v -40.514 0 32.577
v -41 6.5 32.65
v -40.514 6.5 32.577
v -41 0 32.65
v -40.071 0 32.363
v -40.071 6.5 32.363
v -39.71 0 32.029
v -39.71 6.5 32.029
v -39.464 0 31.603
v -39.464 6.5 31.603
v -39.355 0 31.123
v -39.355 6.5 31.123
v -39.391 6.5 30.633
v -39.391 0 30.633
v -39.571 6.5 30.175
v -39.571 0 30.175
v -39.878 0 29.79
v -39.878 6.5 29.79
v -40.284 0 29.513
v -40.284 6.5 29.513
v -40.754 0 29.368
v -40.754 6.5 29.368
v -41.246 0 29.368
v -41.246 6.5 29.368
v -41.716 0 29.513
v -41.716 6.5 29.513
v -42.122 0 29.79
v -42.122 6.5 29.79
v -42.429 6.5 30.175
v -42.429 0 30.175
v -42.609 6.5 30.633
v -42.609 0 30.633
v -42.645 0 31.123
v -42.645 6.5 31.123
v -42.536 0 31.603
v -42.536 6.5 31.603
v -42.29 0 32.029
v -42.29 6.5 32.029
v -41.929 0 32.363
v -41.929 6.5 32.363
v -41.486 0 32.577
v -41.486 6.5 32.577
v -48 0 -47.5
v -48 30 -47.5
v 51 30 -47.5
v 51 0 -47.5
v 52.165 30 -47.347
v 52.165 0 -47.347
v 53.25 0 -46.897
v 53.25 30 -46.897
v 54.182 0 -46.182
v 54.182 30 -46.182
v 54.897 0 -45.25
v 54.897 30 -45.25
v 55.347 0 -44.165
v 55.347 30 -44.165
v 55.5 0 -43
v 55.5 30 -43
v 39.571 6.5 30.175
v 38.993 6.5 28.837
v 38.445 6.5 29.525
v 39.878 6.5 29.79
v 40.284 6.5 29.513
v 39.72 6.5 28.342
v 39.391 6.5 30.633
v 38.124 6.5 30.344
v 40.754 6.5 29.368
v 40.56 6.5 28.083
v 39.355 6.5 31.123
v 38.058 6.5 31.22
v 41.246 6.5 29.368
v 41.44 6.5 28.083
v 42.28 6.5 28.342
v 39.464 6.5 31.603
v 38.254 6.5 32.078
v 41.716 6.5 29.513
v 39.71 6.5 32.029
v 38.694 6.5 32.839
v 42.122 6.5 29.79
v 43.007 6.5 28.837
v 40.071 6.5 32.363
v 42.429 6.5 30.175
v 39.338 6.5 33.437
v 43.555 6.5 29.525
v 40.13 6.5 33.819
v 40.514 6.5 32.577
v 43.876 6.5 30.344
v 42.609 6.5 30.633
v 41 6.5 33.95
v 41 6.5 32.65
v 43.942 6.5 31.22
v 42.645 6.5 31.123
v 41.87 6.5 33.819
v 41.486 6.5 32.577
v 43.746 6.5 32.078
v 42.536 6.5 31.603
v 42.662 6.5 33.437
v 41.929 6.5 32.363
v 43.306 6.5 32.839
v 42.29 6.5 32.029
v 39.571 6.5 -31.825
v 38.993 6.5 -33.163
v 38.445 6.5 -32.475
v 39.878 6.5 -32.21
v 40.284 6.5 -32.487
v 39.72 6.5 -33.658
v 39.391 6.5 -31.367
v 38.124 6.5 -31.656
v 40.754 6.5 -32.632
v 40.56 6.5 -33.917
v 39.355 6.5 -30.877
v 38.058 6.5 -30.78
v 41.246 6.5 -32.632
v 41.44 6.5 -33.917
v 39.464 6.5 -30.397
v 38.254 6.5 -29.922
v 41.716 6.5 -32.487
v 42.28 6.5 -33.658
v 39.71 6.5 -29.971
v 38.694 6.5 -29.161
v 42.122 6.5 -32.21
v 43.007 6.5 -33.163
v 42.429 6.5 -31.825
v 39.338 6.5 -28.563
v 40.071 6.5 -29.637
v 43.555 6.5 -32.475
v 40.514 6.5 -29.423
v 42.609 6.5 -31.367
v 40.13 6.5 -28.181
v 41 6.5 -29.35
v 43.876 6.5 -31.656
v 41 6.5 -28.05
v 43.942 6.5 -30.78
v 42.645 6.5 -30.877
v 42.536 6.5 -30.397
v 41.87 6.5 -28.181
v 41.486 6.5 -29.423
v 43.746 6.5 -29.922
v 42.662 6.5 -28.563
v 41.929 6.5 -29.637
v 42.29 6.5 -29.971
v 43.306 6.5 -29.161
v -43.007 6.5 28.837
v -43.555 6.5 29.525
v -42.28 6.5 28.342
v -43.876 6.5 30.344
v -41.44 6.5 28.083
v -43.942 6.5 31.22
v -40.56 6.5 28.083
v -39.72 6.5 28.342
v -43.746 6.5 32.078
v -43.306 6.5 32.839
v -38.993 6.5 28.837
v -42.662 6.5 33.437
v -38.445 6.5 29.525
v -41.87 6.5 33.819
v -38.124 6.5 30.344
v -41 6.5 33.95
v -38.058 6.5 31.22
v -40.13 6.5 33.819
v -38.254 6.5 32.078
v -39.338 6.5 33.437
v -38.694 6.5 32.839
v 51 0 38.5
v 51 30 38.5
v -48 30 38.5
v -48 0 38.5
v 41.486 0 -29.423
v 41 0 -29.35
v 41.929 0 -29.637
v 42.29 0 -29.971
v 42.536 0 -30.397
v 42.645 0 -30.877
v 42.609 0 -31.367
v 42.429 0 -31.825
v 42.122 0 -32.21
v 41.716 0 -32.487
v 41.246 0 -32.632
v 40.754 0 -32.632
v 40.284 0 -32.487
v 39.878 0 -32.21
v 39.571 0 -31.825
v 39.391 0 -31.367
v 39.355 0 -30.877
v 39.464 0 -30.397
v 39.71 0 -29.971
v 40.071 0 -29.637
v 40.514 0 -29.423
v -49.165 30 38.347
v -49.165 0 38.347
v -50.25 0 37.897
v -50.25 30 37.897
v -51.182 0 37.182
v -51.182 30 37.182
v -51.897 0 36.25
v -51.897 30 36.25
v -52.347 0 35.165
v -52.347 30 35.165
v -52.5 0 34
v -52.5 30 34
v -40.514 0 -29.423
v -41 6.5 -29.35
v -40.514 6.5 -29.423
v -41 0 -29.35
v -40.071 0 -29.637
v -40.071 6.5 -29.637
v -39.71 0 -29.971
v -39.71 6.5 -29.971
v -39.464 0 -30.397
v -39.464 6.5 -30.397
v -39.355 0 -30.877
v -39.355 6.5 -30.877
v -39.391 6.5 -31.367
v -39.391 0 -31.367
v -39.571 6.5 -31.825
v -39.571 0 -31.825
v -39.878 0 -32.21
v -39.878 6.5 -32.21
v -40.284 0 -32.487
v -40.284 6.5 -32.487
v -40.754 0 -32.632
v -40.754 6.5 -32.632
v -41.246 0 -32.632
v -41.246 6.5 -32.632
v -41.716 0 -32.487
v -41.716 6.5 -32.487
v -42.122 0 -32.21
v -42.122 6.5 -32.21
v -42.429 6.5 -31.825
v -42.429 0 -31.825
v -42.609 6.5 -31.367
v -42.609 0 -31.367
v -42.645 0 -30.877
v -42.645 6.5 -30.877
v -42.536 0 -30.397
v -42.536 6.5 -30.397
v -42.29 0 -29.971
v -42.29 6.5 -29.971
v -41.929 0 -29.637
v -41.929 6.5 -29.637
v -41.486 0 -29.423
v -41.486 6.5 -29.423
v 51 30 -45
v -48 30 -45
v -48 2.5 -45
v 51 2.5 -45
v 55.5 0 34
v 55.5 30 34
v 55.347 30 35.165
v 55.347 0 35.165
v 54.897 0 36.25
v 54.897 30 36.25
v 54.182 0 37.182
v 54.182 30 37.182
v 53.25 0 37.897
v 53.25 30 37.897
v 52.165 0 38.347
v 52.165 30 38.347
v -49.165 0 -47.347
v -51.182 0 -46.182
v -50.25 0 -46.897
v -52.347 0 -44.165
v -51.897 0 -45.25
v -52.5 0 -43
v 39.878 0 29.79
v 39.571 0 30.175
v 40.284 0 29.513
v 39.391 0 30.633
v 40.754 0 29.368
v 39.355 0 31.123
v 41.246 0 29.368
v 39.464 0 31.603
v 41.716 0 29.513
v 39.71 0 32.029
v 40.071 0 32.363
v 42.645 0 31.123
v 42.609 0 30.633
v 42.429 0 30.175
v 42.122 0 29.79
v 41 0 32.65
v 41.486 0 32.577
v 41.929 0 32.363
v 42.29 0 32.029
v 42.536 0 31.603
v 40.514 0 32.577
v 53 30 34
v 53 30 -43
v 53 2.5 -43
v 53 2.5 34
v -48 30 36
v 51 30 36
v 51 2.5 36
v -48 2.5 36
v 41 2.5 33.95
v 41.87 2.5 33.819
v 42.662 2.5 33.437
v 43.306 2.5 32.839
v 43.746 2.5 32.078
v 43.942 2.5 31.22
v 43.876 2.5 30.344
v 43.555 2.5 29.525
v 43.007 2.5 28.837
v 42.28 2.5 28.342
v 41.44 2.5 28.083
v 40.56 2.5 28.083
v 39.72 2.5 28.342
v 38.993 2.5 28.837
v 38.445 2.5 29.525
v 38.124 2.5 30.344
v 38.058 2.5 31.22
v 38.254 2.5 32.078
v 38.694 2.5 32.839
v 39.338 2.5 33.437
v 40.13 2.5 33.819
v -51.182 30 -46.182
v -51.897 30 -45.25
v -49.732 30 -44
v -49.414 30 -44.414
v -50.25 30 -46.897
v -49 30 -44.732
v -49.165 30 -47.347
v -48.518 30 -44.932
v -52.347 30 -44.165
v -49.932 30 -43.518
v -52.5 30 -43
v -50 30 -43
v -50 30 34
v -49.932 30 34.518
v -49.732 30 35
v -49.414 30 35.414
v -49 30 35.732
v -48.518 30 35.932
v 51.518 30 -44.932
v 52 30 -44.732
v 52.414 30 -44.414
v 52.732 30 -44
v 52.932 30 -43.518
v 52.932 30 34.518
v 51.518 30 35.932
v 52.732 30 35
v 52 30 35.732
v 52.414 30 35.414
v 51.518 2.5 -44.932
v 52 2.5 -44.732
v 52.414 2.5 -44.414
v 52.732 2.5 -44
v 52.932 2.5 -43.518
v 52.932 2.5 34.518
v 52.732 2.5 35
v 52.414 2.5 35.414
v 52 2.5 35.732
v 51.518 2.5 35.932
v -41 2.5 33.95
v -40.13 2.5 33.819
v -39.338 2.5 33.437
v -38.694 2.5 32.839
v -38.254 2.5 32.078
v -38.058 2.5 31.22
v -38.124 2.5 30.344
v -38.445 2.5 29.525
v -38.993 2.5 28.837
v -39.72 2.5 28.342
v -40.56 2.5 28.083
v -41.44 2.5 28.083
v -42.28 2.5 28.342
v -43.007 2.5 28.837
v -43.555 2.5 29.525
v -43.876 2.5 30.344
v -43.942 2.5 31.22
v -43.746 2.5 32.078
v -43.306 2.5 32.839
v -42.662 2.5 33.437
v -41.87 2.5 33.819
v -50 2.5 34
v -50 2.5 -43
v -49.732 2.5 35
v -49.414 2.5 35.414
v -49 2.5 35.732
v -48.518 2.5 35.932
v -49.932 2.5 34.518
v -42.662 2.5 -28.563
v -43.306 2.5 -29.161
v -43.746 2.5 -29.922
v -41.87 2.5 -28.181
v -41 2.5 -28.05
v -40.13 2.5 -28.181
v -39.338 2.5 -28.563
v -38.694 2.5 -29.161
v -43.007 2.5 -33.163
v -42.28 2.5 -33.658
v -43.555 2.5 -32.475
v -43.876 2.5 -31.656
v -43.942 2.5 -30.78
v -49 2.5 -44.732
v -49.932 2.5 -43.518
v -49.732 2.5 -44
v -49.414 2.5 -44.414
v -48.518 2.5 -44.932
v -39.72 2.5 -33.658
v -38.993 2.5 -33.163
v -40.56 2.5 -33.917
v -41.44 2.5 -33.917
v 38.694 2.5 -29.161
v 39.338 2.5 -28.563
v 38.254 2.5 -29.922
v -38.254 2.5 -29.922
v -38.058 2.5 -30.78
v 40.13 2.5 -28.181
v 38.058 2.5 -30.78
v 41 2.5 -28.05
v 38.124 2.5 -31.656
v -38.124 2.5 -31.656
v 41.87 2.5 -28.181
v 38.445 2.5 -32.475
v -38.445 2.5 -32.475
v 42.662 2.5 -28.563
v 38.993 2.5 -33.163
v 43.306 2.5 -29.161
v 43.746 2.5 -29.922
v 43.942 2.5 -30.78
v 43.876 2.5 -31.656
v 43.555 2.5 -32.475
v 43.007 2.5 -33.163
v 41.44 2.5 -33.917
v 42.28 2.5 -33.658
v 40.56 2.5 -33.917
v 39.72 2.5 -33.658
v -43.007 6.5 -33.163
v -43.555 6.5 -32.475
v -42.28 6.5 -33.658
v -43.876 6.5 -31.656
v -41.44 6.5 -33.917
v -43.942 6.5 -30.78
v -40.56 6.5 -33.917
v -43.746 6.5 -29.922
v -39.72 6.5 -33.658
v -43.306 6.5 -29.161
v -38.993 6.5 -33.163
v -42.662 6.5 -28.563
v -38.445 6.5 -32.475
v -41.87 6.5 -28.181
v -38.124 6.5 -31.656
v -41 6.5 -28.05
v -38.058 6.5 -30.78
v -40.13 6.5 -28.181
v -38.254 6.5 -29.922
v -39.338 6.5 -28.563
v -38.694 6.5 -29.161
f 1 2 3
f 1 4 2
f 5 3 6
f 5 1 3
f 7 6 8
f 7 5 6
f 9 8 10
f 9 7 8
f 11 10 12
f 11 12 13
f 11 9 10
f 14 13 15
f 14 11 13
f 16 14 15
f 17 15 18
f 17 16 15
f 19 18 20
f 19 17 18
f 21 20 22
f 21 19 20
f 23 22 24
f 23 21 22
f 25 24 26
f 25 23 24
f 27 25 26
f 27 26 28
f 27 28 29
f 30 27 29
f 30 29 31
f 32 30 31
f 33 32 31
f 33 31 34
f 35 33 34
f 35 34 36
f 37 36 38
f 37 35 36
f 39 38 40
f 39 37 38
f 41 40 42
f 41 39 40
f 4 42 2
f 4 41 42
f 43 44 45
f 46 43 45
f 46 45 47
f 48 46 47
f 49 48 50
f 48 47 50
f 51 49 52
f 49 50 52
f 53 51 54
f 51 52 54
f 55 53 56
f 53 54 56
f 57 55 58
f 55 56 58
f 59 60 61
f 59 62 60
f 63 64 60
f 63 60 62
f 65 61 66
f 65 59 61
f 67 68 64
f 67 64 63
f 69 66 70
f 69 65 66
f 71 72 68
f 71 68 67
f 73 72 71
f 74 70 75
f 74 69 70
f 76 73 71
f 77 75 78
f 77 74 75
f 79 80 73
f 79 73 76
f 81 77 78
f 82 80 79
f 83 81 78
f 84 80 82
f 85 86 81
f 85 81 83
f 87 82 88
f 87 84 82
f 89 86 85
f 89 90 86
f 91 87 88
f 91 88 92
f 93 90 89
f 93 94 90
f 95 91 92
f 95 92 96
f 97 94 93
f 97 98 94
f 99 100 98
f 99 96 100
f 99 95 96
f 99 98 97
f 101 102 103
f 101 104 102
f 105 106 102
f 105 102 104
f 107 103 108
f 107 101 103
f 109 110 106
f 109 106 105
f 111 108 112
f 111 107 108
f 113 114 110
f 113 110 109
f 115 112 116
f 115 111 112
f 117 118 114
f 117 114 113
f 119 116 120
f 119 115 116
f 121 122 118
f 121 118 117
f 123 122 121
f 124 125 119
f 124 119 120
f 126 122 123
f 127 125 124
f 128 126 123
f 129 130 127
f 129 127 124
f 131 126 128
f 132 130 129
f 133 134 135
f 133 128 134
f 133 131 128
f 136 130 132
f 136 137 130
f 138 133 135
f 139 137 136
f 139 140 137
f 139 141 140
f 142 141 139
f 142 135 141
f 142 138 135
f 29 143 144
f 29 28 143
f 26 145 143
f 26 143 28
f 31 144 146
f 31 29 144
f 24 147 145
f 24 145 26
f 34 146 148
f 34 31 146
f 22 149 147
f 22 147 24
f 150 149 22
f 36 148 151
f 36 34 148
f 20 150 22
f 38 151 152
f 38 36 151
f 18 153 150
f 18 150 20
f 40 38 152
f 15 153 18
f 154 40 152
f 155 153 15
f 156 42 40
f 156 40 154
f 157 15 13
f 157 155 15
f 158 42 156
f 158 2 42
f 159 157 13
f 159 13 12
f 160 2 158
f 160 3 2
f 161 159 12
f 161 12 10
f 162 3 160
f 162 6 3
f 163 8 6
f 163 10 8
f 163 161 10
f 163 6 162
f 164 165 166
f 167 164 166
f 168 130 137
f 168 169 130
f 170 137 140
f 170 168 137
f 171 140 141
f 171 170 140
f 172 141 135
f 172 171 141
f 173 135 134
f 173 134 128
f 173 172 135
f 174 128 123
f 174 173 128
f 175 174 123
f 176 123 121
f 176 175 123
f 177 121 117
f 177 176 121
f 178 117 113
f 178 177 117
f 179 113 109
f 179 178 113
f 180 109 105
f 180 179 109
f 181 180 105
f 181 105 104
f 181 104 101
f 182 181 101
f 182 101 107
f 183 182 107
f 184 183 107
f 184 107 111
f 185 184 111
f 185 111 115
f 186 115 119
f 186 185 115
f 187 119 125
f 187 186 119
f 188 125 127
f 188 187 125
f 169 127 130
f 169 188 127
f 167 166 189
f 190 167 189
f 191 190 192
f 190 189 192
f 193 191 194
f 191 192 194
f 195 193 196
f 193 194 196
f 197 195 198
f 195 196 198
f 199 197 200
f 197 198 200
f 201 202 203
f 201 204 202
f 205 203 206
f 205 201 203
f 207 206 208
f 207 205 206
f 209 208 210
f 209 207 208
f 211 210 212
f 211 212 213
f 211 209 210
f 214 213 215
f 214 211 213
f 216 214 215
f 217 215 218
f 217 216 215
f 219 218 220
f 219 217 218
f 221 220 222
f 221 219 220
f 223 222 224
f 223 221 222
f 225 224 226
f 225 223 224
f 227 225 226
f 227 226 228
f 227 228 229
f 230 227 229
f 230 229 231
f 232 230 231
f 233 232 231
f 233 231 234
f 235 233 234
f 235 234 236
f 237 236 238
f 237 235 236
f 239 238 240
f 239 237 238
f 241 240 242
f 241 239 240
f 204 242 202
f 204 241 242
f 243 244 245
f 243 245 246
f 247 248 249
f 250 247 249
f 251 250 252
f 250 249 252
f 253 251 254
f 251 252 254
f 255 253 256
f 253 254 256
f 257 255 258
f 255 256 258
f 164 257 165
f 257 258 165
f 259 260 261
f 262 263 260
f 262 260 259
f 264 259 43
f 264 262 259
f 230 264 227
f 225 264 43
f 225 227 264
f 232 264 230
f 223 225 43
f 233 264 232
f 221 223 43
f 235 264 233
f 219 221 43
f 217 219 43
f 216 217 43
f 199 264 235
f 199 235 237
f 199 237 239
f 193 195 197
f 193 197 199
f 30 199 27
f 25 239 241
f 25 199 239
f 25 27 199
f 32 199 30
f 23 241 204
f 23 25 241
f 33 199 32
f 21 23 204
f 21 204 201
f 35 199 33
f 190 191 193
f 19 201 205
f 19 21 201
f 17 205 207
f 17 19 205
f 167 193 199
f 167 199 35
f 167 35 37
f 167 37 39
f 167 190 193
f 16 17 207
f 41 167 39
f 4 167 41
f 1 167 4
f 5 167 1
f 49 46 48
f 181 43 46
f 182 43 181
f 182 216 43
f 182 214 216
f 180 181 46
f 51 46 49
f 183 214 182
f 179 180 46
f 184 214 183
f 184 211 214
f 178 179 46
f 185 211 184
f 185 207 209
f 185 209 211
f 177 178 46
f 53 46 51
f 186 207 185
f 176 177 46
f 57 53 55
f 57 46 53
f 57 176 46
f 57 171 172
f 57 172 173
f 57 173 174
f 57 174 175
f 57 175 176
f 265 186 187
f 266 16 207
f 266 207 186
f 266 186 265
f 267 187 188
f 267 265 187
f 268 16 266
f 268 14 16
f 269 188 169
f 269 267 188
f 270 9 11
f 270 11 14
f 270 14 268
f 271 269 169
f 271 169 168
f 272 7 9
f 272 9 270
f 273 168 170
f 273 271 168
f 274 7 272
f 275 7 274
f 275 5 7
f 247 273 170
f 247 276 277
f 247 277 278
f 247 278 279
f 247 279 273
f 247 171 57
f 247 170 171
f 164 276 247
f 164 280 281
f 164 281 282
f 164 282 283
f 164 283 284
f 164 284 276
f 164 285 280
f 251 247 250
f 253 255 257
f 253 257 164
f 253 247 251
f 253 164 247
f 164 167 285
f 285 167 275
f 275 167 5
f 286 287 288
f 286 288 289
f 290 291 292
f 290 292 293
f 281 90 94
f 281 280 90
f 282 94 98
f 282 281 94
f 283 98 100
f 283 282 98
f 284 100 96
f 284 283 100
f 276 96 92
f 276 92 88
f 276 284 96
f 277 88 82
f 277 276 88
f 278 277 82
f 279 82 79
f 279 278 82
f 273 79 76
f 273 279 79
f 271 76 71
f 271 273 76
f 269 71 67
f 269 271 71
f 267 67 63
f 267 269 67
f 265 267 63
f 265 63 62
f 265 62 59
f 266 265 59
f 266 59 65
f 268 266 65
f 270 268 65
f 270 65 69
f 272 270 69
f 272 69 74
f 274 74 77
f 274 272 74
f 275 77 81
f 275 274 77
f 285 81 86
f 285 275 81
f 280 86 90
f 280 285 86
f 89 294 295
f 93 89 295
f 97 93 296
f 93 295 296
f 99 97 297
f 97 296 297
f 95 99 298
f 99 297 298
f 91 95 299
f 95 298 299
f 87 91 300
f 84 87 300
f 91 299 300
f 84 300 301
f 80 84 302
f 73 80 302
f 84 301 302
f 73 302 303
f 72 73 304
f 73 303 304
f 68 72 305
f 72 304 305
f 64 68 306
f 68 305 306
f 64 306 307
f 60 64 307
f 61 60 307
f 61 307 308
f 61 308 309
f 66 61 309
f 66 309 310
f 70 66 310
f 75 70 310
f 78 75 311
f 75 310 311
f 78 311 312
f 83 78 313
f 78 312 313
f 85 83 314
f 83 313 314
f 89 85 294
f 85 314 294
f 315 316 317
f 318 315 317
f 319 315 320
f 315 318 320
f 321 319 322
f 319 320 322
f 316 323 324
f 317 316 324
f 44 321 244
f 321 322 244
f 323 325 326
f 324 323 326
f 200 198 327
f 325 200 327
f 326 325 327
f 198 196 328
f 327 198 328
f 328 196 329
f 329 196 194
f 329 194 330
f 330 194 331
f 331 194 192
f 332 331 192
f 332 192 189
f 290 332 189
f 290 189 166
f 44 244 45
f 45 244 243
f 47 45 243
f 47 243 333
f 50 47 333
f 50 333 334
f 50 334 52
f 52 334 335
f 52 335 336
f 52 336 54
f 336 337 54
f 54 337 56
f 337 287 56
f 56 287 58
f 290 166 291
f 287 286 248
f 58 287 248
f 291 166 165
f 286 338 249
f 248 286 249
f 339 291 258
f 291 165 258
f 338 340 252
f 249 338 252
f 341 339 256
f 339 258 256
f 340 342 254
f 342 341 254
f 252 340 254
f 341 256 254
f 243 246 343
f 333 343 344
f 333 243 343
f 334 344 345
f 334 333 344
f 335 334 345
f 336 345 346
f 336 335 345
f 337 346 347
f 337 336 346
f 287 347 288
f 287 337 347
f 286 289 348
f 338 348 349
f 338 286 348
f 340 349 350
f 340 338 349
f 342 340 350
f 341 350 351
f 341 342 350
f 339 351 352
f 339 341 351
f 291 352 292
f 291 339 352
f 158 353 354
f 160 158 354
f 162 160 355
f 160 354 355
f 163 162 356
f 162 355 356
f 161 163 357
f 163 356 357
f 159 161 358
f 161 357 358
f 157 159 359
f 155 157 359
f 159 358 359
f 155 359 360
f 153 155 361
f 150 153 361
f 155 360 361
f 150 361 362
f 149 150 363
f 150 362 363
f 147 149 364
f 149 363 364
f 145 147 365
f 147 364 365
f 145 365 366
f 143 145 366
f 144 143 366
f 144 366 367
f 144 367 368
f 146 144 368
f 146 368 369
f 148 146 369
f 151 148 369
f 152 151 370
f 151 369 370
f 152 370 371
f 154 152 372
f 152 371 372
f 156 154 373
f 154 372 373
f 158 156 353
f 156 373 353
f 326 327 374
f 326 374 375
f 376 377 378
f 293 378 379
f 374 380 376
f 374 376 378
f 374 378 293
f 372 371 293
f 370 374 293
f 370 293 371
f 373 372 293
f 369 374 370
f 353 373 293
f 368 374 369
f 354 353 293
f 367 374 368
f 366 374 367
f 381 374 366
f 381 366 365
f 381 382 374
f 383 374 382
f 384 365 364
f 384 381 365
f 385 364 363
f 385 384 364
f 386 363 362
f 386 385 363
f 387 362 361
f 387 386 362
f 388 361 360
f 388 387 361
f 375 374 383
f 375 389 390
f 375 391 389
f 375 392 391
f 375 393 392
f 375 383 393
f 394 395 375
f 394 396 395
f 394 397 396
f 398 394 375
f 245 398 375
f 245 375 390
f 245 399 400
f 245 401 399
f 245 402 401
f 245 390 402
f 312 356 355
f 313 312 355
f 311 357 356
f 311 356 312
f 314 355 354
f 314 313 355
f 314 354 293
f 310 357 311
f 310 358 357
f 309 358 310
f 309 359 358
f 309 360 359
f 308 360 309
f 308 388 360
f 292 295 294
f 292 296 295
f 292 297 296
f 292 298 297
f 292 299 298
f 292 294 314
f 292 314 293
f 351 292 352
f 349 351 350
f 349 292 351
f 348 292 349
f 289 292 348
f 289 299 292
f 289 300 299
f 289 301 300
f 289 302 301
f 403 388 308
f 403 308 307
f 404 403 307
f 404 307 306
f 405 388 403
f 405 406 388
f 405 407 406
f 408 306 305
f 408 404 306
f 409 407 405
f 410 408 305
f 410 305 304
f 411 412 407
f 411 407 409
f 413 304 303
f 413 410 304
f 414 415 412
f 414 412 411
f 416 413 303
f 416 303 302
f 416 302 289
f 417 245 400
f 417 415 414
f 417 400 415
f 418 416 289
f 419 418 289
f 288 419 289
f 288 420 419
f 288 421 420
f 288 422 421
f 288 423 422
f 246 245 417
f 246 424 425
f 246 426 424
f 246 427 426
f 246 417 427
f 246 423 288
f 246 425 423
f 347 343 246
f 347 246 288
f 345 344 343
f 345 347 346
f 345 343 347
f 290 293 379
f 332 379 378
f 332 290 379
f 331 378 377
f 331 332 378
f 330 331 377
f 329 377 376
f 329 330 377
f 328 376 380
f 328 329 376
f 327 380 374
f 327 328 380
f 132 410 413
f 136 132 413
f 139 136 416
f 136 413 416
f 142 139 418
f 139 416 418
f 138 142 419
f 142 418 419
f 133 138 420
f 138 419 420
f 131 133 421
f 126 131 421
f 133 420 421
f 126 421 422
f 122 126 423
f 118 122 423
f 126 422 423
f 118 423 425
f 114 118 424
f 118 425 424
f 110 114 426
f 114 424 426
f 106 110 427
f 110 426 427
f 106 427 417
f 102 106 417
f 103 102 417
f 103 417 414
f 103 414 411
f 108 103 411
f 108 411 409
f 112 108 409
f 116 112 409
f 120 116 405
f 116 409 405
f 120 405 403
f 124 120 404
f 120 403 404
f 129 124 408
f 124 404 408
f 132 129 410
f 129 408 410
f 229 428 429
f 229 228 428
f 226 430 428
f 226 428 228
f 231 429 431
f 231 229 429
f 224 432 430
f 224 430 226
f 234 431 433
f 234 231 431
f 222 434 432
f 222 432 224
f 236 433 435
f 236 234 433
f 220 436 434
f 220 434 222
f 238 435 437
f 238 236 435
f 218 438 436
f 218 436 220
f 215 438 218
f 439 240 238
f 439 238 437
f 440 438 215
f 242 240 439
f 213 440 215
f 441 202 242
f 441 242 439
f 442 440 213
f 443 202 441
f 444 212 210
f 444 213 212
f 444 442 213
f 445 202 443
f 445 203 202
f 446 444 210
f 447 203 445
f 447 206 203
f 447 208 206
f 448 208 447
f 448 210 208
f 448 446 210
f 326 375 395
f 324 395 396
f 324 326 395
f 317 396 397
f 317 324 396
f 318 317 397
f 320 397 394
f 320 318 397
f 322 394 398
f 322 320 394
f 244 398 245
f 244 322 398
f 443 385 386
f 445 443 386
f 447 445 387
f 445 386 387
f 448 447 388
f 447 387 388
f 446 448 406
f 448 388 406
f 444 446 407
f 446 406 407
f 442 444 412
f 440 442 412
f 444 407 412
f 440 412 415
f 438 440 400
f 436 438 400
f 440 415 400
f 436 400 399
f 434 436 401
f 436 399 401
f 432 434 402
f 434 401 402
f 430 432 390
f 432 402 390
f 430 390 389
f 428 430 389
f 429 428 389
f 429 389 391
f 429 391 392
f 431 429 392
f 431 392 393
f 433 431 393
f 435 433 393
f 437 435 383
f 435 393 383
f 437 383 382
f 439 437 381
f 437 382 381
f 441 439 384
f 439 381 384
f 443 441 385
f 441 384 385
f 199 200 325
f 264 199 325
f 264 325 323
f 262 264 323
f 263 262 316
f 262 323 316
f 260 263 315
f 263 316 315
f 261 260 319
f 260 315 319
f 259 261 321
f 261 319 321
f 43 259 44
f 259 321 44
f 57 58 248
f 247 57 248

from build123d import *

# Parameters (mm, degrees)
SKETCH_1_W      = 103
SKETCH_1_H      = 81
SKETCH_1_R      = 1.65
EXTRUDE_1_DEPTH = 2.5
FILLET_1_R      = 2
EXTRUDE_START   = -30
EXTRUDE_2_DEPTH = 30
SKETCH_5_R      = 2.95
SKETCH_5_R_2    = 1.65
EXTRUDE_3_DEPTH = 4


with BuildPart() as part:
    # 草图1 → 凸台-拉伸1 (new body)
    with BuildSketch(Plane(origin=(0, 0, 0), x_dir=(1, 0, 0), z_dir=(0, 1, 0))):
        with Locations((1.5, 4.5)):
            Rectangle(SKETCH_1_W, SKETCH_1_H)
        with Locations(Location((41, 31, 0), (0, 0, 270))):
            Circle(SKETCH_1_R, mode=Mode.SUBTRACT)
        with Locations(Location((41, -31, 0), (0, 0, 270))):
            Circle(SKETCH_1_R, mode=Mode.SUBTRACT)
        with Locations(Location((-41, -31, 0), (0, 0, 270))):
            Circle(SKETCH_1_R, mode=Mode.SUBTRACT)
        with Locations(Location((-41, 31, 0), (0, 0, 270))):
            Circle(SKETCH_1_R, mode=Mode.SUBTRACT)
    extrude(amount=EXTRUDE_1_DEPTH)

    # 圆角1
    fillet_1_edges = [part.edges().sort_by_distance(p)[0] for p in [
        (-50, 1.25, -45),
        (53, 1.25, -45),
        (53, 1.25, 36),
        (-50, 1.25, 36),
    ]]
    fillet(fillet_1_edges, radius=FILLET_1_R)

    # 草图4 → 凸台-拉伸2 (add)
    with BuildSketch(Plane.XZ.offset(EXTRUDE_START)):
        with BuildLine():
            Line((51, 38.5), (-48, 38.5))
            ThreePointArc((-48, 38.5), (-51.181980515, 37.181980515), (-52.5, 34))
            Line((-52.5, 34), (-52.5, -43))
            ThreePointArc((-52.5, -43), (-51.181980515, -46.181980515), (-48, -47.5))
            Line((-48, -47.5), (51, -47.5))
            ThreePointArc((51, -47.5), (54.181980515, -46.181980515), (55.5, -43))
            Line((55.5, -43), (55.5, 34))
            ThreePointArc((55.5, 34), (54.181980515, 37.181980515), (51, 38.5))
        make_face()
        with BuildLine():
            Line((51, 36), (-48, 36))
            ThreePointArc((-48, 36), (-49.414213562, 35.414213562), (-50, 34))
            Line((-50, 34), (-50, -43))
            ThreePointArc((-50, -43), (-49.414213562, -44.414213562), (-48, -45))
            Line((-48, -45), (51, -45))
            ThreePointArc((51, -45), (52.414213562, -44.414213562), (53, -43))
            Line((53, -43), (53, 34))
            ThreePointArc((53, 34), (52.414213562, 35.414213562), (51, 36))
        make_face(mode=Mode.SUBTRACT)
    extrude(amount=EXTRUDE_2_DEPTH)

    # 草图5 → 凸台-拉伸3 (add)
    # profile 1 of 4: a face of its own
    with BuildSketch(Plane(origin=(0, 2.5, 0), x_dir=(1, 0, 0), z_dir=(0, 1, 0))):
        with Locations(Location((-41, -31, 0), (0, 0, 270))):
            Circle(SKETCH_5_R)
        with Locations(Location((-41, -31, 0), (0, 0, 270))):
            Circle(SKETCH_5_R_2, mode=Mode.SUBTRACT)
    # profile 2 of 4: a face of its own
    with BuildSketch(Plane(origin=(0, 2.5, 0), x_dir=(1, 0, 0), z_dir=(0, 1, 0))):
        with Locations(Location((41, -31, 0), (0, 0, 270))):
            Circle(SKETCH_5_R)
        with Locations(Location((41, -31, 0), (0, 0, 270))):
            Circle(SKETCH_5_R_2, mode=Mode.SUBTRACT)
    # profile 3 of 4: a face of its own
    with BuildSketch(Plane(origin=(0, 2.5, 0), x_dir=(1, 0, 0), z_dir=(0, 1, 0))):
        with Locations(Location((41, 31, 0), (0, 0, 270))):
            Circle(SKETCH_5_R)
        with Locations(Location((41, 31, 0), (0, 0, 270))):
            Circle(SKETCH_5_R_2, mode=Mode.SUBTRACT)
    # profile 4 of 4: a face of its own
    with BuildSketch(Plane(origin=(0, 2.5, 0), x_dir=(1, 0, 0), z_dir=(0, 1, 0))):
        with Locations(Location((-41, 31, 0), (0, 0, 270))):
            Circle(SKETCH_5_R)
        with Locations(Location((-41, 31, 0), (0, 0, 270))):
            Circle(SKETCH_5_R_2, mode=Mode.SUBTRACT)
    extrude(amount=EXTRUDE_3_DEPTH)


solid = part.part
